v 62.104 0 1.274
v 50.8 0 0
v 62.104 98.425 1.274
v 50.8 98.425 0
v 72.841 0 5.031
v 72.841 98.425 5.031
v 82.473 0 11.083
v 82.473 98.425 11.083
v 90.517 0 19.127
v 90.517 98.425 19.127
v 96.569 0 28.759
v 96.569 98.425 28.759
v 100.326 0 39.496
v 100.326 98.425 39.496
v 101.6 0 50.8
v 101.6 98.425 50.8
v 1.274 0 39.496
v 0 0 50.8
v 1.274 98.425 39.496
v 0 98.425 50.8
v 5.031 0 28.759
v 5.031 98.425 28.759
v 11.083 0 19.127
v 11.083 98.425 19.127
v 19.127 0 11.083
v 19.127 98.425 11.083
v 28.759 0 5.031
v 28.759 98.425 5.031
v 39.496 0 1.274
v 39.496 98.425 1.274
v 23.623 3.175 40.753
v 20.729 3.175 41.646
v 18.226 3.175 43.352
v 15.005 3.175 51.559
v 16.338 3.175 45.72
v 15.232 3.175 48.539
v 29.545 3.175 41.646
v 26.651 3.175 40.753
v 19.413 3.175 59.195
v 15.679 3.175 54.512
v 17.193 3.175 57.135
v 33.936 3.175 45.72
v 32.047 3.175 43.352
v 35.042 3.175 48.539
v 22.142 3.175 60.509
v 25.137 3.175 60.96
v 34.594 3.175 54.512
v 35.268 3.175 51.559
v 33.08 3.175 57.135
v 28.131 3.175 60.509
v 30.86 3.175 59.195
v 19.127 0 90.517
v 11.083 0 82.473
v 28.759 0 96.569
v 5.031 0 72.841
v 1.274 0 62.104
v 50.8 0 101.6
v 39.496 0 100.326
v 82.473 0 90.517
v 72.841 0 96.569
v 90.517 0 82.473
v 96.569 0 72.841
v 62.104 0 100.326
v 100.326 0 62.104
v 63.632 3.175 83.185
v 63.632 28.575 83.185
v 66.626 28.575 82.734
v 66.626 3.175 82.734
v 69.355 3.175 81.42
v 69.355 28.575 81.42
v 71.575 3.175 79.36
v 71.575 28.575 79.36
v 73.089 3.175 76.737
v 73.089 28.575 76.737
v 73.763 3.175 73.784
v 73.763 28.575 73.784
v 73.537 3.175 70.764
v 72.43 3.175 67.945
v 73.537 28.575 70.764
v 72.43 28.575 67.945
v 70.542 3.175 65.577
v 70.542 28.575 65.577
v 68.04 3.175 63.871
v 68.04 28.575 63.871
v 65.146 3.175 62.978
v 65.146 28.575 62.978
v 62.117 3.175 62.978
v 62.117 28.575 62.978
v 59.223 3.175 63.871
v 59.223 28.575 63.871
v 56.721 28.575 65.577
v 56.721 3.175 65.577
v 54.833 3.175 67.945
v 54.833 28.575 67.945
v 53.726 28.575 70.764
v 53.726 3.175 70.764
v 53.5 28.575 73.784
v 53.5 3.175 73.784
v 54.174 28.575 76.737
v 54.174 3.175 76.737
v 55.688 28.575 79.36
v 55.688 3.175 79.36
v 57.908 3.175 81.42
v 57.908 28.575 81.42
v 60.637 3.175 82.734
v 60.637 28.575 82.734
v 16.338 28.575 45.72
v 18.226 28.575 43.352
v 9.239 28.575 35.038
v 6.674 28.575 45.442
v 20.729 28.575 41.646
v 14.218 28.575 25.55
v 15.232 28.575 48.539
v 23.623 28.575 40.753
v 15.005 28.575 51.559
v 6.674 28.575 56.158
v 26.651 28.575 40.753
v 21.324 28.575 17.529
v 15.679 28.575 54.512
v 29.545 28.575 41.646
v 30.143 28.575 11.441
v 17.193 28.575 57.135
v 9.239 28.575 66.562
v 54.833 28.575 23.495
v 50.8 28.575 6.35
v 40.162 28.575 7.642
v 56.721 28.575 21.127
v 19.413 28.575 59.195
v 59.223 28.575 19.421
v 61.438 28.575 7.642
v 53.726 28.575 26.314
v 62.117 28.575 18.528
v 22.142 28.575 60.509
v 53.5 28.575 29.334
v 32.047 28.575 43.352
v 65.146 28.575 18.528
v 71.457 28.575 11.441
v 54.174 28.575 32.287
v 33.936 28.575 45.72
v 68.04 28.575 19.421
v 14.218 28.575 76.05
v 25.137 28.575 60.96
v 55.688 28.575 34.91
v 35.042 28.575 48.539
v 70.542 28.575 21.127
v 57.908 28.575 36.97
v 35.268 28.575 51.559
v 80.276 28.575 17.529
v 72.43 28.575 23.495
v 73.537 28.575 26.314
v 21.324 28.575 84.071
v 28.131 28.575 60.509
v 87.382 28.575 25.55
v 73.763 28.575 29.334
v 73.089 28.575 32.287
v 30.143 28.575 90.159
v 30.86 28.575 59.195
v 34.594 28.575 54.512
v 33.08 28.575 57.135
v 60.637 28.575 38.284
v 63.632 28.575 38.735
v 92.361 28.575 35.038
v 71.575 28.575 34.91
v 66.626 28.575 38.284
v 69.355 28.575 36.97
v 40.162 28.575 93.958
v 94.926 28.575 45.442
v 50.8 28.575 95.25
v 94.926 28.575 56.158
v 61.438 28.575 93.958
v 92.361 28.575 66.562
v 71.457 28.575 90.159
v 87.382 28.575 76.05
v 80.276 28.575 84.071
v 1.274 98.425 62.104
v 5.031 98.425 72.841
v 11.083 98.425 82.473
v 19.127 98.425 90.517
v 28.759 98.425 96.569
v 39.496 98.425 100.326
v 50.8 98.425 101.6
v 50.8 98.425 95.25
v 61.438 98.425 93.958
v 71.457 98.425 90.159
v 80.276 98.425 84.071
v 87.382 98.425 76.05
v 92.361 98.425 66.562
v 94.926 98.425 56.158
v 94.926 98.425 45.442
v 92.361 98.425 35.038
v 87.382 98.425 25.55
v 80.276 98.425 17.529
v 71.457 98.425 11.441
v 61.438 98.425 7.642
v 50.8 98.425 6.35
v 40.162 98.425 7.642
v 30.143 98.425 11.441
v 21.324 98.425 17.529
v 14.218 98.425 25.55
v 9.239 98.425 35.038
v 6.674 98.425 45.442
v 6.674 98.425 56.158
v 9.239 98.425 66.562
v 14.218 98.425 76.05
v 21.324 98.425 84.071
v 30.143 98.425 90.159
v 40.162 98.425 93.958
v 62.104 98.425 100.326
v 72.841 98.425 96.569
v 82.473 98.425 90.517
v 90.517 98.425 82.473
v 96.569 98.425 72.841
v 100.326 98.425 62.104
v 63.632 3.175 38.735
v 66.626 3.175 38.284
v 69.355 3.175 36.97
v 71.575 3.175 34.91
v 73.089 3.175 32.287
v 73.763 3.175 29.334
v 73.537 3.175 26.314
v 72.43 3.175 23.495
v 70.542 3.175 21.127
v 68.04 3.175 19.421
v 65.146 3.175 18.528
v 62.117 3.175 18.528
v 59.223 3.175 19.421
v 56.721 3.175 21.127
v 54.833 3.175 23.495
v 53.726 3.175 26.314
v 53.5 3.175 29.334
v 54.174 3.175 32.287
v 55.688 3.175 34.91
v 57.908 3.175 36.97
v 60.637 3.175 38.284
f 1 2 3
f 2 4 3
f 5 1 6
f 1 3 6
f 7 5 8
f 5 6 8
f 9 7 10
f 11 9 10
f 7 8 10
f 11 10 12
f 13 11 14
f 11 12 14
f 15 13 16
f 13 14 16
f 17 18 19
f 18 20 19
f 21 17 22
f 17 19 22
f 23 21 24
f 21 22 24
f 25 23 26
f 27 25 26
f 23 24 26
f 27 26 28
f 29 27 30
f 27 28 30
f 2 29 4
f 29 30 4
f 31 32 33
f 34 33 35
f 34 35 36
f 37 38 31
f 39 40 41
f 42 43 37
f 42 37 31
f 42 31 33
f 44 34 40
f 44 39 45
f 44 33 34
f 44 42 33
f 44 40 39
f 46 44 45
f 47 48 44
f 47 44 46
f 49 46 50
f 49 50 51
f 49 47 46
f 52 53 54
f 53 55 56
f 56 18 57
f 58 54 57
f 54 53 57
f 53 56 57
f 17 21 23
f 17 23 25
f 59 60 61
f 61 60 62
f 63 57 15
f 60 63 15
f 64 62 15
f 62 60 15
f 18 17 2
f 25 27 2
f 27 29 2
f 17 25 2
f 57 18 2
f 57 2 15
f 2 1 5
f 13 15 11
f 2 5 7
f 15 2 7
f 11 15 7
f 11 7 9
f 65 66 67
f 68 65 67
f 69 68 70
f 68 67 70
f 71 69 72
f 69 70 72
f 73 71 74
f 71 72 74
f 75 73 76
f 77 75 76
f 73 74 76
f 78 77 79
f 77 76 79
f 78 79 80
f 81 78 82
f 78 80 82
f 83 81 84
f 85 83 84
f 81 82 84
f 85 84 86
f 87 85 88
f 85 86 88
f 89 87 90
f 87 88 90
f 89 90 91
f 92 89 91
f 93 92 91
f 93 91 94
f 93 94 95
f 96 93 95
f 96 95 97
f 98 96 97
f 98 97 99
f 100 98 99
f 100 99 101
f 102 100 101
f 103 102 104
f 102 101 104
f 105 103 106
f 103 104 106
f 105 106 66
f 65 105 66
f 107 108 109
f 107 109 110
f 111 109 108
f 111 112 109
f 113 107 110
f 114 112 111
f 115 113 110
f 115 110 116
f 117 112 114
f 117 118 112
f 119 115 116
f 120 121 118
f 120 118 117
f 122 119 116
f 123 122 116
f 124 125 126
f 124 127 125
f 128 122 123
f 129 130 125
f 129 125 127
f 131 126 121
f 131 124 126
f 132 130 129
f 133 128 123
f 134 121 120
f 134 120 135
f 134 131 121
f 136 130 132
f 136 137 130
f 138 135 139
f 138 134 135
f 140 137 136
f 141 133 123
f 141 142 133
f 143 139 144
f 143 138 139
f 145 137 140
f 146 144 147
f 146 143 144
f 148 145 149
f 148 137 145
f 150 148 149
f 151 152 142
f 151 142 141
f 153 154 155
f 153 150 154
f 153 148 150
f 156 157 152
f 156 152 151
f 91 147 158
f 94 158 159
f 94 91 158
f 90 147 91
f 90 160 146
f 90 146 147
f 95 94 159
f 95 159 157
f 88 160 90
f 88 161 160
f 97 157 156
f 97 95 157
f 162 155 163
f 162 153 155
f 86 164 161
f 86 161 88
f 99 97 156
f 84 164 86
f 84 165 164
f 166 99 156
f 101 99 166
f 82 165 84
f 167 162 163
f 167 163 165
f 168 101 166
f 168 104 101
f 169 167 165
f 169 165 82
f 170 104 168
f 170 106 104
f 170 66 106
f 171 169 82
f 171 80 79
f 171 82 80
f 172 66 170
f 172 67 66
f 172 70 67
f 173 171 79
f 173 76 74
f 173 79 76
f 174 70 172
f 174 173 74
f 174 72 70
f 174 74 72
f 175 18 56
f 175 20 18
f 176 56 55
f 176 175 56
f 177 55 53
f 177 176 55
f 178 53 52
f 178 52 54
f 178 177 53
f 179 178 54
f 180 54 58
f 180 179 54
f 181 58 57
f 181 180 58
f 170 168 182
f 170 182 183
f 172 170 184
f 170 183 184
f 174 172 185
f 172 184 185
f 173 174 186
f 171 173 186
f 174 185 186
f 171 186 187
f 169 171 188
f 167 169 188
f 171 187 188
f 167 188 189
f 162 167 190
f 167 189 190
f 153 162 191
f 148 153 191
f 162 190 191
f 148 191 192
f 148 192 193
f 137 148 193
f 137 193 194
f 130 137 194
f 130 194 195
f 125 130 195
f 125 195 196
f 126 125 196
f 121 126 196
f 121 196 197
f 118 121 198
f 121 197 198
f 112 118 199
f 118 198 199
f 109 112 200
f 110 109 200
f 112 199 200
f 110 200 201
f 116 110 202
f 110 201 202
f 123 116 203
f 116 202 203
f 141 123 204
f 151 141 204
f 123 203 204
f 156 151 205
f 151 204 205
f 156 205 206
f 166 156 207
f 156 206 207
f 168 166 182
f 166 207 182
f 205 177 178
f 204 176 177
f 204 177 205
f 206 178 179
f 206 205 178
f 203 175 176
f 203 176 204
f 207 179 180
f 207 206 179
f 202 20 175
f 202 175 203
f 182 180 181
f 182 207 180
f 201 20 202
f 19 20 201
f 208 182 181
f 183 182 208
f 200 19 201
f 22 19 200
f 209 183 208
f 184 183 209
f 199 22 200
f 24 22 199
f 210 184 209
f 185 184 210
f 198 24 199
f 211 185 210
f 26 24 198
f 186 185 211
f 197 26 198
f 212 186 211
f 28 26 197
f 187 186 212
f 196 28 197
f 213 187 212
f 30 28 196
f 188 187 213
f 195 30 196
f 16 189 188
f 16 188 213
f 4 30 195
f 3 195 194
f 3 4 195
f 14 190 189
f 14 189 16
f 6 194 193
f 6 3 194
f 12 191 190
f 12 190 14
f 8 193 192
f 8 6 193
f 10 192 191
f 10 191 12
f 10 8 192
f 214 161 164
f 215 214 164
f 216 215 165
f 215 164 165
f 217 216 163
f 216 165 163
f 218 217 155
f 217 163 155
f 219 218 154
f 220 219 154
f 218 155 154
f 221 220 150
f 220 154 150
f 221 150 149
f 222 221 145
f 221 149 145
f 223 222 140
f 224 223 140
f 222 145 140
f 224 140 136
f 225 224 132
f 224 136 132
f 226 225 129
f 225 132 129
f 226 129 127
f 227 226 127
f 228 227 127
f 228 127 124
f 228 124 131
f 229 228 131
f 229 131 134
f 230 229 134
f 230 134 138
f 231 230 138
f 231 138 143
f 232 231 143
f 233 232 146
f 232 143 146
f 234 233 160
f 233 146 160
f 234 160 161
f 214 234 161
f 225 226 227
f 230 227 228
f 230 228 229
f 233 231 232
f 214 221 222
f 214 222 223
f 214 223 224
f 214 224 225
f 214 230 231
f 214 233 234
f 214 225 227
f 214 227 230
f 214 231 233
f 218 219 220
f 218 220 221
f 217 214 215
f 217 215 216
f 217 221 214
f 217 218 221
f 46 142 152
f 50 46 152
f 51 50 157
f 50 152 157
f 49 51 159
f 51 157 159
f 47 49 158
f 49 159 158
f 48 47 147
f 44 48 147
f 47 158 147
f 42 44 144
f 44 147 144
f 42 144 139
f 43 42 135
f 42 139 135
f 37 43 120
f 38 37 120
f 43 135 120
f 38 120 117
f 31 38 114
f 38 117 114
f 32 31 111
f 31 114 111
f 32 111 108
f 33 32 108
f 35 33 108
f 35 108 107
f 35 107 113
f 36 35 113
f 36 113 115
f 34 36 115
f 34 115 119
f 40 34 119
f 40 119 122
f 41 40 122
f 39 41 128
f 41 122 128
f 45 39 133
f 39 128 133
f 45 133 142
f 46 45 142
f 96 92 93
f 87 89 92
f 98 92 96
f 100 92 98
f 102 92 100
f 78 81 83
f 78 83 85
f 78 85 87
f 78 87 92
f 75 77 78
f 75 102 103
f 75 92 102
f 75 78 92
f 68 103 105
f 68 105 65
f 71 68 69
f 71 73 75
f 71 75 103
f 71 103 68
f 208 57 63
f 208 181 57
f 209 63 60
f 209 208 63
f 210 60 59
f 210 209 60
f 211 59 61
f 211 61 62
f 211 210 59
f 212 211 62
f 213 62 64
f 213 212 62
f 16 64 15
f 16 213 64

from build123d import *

# Parameters (mm, degrees)
SKETCH1_W           = 101.6
SKETCH1_H           = 101.6
BOSS_EXTRUDE1_DEPTH = 98.425
SKETCH2_R           = 44.45
CUT_EXTRUDE1_DEPTH  = 69.85
SKETCH3_R           = 10.16
CUT_EXTRUDE2_DEPTH  = 25.4
FILLET1_R           = 50.8


with BuildPart() as part:
    # Sketch1 → Boss-Extrude1 (new body)
    with BuildSketch(Plane(origin=(0, 0, 0), x_dir=(1, 0, 0), z_dir=(0, 1, 0))):
        with Locations((50.8, -50.8)):
            Rectangle(SKETCH1_W, SKETCH1_H)
    extrude(amount=BOSS_EXTRUDE1_DEPTH)

    # Sketch2 → Cut-Extrude1 (cut)
    with BuildSketch(Plane(origin=(0, 98.425, 0), x_dir=(1, 0, 0), z_dir=(0, 1, 0))):
        with Locations(Location((50.8, -50.8, 0), (0, 0, 270))):
            Circle(SKETCH2_R)
    extrude(amount=-CUT_EXTRUDE1_DEPTH, mode=Mode.SUBTRACT)

    # Sketch3 → Cut-Extrude2 (cut)
    with BuildSketch(Plane(origin=(0, 28.575, 0), x_dir=(1, 0, 0), z_dir=(0, 1, 0))):
        with Locations(Location((63.631609733, -73.025, 0), (0, 0, 270))):
            Circle(SKETCH3_R)
        with Locations(Location((25.136780535, -50.8, 0), (0, 0, 270))):
            Circle(SKETCH3_R)
        with Locations(Location((63.631609733, -28.575, 0), (0, 0, 270))):
            Circle(SKETCH3_R)
    extrude(amount=-CUT_EXTRUDE2_DEPTH, mode=Mode.SUBTRACT)

    # Fillet1
    fillet1_edges = [part.edges().sort_by_distance(p)[0] for p in [
        (0, 49.2125, 101.6),
        (0, 49.2125, 0),
        (101.6, 49.2125, 0),
        (101.6, 49.2125, 101.6),
    ]]
    fillet(fillet1_edges, radius=FILLET1_R - 0.0001)  # a hair under: the kernel refuses the full size


solid = part.part
